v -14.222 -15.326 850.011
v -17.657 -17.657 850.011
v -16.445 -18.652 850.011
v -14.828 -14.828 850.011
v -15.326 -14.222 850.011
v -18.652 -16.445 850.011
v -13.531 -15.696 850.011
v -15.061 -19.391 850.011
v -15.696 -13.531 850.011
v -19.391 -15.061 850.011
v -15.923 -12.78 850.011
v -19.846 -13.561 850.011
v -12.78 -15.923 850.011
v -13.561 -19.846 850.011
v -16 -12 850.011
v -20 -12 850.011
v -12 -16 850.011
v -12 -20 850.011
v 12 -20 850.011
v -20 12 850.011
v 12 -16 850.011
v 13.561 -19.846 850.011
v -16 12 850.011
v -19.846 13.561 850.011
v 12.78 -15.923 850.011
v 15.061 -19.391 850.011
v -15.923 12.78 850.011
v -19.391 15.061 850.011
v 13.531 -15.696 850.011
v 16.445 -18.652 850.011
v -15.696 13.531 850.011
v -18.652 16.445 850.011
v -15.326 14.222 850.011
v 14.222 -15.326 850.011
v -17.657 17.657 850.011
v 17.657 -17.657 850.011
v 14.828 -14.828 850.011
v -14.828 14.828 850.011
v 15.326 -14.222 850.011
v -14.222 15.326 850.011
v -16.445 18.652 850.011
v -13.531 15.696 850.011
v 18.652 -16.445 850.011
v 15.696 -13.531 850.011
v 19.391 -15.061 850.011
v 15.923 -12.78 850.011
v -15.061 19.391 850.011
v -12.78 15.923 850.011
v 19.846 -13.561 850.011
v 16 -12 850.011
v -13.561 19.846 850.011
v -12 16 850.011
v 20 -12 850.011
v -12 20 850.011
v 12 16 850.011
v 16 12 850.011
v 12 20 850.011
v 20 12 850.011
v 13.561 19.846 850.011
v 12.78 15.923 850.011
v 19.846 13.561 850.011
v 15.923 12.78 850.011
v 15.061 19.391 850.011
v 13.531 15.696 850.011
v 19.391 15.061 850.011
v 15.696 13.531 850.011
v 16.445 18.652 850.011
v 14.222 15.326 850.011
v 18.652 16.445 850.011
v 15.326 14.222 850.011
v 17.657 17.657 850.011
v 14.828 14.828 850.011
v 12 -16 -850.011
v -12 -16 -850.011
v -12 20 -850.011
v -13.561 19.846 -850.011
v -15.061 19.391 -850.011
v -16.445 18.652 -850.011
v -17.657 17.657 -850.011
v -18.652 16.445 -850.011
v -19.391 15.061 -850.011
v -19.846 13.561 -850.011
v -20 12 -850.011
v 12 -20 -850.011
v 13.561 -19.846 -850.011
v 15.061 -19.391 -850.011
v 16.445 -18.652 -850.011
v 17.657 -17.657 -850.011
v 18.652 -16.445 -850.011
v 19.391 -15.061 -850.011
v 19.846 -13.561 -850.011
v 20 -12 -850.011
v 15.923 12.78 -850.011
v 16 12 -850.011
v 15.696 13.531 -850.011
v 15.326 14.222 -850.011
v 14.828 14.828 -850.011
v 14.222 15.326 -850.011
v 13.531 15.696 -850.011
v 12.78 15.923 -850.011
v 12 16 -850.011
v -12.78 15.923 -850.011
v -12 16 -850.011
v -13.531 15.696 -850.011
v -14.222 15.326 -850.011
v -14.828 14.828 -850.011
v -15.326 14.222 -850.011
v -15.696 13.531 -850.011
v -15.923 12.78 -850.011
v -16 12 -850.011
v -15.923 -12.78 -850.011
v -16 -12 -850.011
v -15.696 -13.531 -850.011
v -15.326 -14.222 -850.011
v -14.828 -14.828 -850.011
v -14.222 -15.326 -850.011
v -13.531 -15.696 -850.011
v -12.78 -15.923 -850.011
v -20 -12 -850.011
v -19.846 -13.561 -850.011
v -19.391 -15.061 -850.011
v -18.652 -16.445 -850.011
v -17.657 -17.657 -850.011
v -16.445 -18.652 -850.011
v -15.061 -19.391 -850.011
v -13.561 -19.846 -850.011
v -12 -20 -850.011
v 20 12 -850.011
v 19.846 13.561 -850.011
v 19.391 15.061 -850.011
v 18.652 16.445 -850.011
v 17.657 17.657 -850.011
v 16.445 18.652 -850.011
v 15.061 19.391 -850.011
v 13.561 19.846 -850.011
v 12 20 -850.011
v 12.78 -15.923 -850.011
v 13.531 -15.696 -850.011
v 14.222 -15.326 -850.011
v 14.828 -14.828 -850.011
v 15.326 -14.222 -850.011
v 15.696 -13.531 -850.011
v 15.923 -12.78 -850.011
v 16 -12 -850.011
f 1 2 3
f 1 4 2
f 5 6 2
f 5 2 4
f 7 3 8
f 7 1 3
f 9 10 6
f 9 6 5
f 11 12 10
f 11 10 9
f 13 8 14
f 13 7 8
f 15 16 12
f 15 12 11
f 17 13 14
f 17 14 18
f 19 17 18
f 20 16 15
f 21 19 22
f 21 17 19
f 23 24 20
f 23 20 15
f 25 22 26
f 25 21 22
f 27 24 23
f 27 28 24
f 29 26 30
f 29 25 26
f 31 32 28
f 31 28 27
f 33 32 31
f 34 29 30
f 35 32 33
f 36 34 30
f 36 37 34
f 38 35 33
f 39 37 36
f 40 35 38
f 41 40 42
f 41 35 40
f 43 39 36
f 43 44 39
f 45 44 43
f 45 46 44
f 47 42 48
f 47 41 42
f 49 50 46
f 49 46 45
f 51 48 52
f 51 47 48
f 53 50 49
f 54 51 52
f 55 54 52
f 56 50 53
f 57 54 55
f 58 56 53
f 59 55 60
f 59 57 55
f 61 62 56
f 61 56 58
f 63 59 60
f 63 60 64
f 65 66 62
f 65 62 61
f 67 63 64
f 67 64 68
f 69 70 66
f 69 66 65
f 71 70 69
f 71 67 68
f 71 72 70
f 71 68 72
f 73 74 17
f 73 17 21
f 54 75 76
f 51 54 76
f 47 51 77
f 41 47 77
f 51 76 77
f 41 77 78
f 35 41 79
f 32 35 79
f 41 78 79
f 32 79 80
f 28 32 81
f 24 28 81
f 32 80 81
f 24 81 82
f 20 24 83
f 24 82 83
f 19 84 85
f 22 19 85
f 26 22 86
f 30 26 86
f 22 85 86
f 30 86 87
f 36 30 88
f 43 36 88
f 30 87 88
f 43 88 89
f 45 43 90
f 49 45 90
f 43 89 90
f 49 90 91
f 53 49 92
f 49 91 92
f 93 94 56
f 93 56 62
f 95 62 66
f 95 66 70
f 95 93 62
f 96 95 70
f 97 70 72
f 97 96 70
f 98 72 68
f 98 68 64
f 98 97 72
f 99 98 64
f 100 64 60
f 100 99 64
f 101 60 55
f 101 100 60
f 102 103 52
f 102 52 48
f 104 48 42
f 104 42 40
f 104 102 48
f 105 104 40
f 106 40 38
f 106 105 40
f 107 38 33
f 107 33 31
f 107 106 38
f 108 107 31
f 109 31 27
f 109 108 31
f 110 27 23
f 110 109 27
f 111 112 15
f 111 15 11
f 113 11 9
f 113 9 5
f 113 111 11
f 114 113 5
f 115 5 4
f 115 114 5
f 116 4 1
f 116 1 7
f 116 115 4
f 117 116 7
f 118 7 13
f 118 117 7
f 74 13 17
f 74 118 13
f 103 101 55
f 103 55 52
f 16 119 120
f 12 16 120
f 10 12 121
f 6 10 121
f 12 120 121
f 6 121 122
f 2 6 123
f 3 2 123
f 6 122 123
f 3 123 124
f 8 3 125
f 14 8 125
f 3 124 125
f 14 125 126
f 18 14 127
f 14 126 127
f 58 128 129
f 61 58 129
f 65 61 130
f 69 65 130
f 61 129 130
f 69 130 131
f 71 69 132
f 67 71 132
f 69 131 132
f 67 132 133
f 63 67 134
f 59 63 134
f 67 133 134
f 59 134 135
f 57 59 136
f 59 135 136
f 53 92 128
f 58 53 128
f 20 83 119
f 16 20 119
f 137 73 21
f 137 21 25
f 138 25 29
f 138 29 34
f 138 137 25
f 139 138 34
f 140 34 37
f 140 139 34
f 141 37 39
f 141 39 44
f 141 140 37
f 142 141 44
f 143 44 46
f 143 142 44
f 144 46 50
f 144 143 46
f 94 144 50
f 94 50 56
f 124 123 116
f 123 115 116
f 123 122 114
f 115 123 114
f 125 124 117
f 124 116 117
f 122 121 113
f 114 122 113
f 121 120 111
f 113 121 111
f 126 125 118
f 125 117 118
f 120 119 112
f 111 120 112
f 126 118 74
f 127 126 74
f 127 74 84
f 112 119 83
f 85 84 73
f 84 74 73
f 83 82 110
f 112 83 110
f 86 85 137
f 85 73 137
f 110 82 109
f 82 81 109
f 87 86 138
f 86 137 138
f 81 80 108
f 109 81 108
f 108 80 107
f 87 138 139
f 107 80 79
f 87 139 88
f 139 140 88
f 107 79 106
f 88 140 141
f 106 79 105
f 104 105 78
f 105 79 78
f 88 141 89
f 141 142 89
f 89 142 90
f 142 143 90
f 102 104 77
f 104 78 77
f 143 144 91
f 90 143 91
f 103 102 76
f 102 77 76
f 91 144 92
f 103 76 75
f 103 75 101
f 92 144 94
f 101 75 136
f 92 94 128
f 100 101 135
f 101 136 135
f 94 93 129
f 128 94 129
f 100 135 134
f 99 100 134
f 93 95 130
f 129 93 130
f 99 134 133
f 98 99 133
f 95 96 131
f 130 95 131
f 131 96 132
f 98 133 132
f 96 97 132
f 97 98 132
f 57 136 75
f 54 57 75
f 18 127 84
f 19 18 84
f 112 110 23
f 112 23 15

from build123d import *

# Parameters (mm, degrees)
SQUARE_TUBE_40_X_40_X_4_2_DEPTH = 1700.022


with BuildPart() as part:
    # Sketch13 → Square tube 40 X 40 X 4(2) (new body)
    with BuildSketch(Plane.XY.offset(-850.011)):
        with BuildLine():
            Line((-12, -20), (12, -20))
            ThreePointArc((12, -20), (17.656854249, -17.656854249), (20, -12))
            Line((20, -12), (20, 12))
            ThreePointArc((20, 12), (17.656854249, 17.656854249), (12, 20))
            Line((12, 20), (-12, 20))
            ThreePointArc((-12, 20), (-17.656854249, 17.656854249), (-20, 12))
            Line((-20, 12), (-20, -12))
            ThreePointArc((-20, -12), (-17.656854249, -17.656854249), (-12, -20))
        make_face()
        with BuildLine():
            Line((-12, -16), (12, -16))
            ThreePointArc((12, -16), (14.828427125, -14.828427125), (16, -12))
            Line((16, -12), (16, 12))
            ThreePointArc((16, 12), (14.828427125, 14.828427125), (12, 16))
            Line((12, 16), (-12, 16))
            ThreePointArc((-12, 16), (-14.828427125, 14.828427125), (-16, 12))
            Line((-16, 12), (-16, -12))
            ThreePointArc((-16, -12), (-14.828427125, -14.828427125), (-12, -16))
        make_face(mode=Mode.SUBTRACT)
    extrude(amount=SQUARE_TUBE_40_X_40_X_4_2_DEPTH)


solid = part.part
